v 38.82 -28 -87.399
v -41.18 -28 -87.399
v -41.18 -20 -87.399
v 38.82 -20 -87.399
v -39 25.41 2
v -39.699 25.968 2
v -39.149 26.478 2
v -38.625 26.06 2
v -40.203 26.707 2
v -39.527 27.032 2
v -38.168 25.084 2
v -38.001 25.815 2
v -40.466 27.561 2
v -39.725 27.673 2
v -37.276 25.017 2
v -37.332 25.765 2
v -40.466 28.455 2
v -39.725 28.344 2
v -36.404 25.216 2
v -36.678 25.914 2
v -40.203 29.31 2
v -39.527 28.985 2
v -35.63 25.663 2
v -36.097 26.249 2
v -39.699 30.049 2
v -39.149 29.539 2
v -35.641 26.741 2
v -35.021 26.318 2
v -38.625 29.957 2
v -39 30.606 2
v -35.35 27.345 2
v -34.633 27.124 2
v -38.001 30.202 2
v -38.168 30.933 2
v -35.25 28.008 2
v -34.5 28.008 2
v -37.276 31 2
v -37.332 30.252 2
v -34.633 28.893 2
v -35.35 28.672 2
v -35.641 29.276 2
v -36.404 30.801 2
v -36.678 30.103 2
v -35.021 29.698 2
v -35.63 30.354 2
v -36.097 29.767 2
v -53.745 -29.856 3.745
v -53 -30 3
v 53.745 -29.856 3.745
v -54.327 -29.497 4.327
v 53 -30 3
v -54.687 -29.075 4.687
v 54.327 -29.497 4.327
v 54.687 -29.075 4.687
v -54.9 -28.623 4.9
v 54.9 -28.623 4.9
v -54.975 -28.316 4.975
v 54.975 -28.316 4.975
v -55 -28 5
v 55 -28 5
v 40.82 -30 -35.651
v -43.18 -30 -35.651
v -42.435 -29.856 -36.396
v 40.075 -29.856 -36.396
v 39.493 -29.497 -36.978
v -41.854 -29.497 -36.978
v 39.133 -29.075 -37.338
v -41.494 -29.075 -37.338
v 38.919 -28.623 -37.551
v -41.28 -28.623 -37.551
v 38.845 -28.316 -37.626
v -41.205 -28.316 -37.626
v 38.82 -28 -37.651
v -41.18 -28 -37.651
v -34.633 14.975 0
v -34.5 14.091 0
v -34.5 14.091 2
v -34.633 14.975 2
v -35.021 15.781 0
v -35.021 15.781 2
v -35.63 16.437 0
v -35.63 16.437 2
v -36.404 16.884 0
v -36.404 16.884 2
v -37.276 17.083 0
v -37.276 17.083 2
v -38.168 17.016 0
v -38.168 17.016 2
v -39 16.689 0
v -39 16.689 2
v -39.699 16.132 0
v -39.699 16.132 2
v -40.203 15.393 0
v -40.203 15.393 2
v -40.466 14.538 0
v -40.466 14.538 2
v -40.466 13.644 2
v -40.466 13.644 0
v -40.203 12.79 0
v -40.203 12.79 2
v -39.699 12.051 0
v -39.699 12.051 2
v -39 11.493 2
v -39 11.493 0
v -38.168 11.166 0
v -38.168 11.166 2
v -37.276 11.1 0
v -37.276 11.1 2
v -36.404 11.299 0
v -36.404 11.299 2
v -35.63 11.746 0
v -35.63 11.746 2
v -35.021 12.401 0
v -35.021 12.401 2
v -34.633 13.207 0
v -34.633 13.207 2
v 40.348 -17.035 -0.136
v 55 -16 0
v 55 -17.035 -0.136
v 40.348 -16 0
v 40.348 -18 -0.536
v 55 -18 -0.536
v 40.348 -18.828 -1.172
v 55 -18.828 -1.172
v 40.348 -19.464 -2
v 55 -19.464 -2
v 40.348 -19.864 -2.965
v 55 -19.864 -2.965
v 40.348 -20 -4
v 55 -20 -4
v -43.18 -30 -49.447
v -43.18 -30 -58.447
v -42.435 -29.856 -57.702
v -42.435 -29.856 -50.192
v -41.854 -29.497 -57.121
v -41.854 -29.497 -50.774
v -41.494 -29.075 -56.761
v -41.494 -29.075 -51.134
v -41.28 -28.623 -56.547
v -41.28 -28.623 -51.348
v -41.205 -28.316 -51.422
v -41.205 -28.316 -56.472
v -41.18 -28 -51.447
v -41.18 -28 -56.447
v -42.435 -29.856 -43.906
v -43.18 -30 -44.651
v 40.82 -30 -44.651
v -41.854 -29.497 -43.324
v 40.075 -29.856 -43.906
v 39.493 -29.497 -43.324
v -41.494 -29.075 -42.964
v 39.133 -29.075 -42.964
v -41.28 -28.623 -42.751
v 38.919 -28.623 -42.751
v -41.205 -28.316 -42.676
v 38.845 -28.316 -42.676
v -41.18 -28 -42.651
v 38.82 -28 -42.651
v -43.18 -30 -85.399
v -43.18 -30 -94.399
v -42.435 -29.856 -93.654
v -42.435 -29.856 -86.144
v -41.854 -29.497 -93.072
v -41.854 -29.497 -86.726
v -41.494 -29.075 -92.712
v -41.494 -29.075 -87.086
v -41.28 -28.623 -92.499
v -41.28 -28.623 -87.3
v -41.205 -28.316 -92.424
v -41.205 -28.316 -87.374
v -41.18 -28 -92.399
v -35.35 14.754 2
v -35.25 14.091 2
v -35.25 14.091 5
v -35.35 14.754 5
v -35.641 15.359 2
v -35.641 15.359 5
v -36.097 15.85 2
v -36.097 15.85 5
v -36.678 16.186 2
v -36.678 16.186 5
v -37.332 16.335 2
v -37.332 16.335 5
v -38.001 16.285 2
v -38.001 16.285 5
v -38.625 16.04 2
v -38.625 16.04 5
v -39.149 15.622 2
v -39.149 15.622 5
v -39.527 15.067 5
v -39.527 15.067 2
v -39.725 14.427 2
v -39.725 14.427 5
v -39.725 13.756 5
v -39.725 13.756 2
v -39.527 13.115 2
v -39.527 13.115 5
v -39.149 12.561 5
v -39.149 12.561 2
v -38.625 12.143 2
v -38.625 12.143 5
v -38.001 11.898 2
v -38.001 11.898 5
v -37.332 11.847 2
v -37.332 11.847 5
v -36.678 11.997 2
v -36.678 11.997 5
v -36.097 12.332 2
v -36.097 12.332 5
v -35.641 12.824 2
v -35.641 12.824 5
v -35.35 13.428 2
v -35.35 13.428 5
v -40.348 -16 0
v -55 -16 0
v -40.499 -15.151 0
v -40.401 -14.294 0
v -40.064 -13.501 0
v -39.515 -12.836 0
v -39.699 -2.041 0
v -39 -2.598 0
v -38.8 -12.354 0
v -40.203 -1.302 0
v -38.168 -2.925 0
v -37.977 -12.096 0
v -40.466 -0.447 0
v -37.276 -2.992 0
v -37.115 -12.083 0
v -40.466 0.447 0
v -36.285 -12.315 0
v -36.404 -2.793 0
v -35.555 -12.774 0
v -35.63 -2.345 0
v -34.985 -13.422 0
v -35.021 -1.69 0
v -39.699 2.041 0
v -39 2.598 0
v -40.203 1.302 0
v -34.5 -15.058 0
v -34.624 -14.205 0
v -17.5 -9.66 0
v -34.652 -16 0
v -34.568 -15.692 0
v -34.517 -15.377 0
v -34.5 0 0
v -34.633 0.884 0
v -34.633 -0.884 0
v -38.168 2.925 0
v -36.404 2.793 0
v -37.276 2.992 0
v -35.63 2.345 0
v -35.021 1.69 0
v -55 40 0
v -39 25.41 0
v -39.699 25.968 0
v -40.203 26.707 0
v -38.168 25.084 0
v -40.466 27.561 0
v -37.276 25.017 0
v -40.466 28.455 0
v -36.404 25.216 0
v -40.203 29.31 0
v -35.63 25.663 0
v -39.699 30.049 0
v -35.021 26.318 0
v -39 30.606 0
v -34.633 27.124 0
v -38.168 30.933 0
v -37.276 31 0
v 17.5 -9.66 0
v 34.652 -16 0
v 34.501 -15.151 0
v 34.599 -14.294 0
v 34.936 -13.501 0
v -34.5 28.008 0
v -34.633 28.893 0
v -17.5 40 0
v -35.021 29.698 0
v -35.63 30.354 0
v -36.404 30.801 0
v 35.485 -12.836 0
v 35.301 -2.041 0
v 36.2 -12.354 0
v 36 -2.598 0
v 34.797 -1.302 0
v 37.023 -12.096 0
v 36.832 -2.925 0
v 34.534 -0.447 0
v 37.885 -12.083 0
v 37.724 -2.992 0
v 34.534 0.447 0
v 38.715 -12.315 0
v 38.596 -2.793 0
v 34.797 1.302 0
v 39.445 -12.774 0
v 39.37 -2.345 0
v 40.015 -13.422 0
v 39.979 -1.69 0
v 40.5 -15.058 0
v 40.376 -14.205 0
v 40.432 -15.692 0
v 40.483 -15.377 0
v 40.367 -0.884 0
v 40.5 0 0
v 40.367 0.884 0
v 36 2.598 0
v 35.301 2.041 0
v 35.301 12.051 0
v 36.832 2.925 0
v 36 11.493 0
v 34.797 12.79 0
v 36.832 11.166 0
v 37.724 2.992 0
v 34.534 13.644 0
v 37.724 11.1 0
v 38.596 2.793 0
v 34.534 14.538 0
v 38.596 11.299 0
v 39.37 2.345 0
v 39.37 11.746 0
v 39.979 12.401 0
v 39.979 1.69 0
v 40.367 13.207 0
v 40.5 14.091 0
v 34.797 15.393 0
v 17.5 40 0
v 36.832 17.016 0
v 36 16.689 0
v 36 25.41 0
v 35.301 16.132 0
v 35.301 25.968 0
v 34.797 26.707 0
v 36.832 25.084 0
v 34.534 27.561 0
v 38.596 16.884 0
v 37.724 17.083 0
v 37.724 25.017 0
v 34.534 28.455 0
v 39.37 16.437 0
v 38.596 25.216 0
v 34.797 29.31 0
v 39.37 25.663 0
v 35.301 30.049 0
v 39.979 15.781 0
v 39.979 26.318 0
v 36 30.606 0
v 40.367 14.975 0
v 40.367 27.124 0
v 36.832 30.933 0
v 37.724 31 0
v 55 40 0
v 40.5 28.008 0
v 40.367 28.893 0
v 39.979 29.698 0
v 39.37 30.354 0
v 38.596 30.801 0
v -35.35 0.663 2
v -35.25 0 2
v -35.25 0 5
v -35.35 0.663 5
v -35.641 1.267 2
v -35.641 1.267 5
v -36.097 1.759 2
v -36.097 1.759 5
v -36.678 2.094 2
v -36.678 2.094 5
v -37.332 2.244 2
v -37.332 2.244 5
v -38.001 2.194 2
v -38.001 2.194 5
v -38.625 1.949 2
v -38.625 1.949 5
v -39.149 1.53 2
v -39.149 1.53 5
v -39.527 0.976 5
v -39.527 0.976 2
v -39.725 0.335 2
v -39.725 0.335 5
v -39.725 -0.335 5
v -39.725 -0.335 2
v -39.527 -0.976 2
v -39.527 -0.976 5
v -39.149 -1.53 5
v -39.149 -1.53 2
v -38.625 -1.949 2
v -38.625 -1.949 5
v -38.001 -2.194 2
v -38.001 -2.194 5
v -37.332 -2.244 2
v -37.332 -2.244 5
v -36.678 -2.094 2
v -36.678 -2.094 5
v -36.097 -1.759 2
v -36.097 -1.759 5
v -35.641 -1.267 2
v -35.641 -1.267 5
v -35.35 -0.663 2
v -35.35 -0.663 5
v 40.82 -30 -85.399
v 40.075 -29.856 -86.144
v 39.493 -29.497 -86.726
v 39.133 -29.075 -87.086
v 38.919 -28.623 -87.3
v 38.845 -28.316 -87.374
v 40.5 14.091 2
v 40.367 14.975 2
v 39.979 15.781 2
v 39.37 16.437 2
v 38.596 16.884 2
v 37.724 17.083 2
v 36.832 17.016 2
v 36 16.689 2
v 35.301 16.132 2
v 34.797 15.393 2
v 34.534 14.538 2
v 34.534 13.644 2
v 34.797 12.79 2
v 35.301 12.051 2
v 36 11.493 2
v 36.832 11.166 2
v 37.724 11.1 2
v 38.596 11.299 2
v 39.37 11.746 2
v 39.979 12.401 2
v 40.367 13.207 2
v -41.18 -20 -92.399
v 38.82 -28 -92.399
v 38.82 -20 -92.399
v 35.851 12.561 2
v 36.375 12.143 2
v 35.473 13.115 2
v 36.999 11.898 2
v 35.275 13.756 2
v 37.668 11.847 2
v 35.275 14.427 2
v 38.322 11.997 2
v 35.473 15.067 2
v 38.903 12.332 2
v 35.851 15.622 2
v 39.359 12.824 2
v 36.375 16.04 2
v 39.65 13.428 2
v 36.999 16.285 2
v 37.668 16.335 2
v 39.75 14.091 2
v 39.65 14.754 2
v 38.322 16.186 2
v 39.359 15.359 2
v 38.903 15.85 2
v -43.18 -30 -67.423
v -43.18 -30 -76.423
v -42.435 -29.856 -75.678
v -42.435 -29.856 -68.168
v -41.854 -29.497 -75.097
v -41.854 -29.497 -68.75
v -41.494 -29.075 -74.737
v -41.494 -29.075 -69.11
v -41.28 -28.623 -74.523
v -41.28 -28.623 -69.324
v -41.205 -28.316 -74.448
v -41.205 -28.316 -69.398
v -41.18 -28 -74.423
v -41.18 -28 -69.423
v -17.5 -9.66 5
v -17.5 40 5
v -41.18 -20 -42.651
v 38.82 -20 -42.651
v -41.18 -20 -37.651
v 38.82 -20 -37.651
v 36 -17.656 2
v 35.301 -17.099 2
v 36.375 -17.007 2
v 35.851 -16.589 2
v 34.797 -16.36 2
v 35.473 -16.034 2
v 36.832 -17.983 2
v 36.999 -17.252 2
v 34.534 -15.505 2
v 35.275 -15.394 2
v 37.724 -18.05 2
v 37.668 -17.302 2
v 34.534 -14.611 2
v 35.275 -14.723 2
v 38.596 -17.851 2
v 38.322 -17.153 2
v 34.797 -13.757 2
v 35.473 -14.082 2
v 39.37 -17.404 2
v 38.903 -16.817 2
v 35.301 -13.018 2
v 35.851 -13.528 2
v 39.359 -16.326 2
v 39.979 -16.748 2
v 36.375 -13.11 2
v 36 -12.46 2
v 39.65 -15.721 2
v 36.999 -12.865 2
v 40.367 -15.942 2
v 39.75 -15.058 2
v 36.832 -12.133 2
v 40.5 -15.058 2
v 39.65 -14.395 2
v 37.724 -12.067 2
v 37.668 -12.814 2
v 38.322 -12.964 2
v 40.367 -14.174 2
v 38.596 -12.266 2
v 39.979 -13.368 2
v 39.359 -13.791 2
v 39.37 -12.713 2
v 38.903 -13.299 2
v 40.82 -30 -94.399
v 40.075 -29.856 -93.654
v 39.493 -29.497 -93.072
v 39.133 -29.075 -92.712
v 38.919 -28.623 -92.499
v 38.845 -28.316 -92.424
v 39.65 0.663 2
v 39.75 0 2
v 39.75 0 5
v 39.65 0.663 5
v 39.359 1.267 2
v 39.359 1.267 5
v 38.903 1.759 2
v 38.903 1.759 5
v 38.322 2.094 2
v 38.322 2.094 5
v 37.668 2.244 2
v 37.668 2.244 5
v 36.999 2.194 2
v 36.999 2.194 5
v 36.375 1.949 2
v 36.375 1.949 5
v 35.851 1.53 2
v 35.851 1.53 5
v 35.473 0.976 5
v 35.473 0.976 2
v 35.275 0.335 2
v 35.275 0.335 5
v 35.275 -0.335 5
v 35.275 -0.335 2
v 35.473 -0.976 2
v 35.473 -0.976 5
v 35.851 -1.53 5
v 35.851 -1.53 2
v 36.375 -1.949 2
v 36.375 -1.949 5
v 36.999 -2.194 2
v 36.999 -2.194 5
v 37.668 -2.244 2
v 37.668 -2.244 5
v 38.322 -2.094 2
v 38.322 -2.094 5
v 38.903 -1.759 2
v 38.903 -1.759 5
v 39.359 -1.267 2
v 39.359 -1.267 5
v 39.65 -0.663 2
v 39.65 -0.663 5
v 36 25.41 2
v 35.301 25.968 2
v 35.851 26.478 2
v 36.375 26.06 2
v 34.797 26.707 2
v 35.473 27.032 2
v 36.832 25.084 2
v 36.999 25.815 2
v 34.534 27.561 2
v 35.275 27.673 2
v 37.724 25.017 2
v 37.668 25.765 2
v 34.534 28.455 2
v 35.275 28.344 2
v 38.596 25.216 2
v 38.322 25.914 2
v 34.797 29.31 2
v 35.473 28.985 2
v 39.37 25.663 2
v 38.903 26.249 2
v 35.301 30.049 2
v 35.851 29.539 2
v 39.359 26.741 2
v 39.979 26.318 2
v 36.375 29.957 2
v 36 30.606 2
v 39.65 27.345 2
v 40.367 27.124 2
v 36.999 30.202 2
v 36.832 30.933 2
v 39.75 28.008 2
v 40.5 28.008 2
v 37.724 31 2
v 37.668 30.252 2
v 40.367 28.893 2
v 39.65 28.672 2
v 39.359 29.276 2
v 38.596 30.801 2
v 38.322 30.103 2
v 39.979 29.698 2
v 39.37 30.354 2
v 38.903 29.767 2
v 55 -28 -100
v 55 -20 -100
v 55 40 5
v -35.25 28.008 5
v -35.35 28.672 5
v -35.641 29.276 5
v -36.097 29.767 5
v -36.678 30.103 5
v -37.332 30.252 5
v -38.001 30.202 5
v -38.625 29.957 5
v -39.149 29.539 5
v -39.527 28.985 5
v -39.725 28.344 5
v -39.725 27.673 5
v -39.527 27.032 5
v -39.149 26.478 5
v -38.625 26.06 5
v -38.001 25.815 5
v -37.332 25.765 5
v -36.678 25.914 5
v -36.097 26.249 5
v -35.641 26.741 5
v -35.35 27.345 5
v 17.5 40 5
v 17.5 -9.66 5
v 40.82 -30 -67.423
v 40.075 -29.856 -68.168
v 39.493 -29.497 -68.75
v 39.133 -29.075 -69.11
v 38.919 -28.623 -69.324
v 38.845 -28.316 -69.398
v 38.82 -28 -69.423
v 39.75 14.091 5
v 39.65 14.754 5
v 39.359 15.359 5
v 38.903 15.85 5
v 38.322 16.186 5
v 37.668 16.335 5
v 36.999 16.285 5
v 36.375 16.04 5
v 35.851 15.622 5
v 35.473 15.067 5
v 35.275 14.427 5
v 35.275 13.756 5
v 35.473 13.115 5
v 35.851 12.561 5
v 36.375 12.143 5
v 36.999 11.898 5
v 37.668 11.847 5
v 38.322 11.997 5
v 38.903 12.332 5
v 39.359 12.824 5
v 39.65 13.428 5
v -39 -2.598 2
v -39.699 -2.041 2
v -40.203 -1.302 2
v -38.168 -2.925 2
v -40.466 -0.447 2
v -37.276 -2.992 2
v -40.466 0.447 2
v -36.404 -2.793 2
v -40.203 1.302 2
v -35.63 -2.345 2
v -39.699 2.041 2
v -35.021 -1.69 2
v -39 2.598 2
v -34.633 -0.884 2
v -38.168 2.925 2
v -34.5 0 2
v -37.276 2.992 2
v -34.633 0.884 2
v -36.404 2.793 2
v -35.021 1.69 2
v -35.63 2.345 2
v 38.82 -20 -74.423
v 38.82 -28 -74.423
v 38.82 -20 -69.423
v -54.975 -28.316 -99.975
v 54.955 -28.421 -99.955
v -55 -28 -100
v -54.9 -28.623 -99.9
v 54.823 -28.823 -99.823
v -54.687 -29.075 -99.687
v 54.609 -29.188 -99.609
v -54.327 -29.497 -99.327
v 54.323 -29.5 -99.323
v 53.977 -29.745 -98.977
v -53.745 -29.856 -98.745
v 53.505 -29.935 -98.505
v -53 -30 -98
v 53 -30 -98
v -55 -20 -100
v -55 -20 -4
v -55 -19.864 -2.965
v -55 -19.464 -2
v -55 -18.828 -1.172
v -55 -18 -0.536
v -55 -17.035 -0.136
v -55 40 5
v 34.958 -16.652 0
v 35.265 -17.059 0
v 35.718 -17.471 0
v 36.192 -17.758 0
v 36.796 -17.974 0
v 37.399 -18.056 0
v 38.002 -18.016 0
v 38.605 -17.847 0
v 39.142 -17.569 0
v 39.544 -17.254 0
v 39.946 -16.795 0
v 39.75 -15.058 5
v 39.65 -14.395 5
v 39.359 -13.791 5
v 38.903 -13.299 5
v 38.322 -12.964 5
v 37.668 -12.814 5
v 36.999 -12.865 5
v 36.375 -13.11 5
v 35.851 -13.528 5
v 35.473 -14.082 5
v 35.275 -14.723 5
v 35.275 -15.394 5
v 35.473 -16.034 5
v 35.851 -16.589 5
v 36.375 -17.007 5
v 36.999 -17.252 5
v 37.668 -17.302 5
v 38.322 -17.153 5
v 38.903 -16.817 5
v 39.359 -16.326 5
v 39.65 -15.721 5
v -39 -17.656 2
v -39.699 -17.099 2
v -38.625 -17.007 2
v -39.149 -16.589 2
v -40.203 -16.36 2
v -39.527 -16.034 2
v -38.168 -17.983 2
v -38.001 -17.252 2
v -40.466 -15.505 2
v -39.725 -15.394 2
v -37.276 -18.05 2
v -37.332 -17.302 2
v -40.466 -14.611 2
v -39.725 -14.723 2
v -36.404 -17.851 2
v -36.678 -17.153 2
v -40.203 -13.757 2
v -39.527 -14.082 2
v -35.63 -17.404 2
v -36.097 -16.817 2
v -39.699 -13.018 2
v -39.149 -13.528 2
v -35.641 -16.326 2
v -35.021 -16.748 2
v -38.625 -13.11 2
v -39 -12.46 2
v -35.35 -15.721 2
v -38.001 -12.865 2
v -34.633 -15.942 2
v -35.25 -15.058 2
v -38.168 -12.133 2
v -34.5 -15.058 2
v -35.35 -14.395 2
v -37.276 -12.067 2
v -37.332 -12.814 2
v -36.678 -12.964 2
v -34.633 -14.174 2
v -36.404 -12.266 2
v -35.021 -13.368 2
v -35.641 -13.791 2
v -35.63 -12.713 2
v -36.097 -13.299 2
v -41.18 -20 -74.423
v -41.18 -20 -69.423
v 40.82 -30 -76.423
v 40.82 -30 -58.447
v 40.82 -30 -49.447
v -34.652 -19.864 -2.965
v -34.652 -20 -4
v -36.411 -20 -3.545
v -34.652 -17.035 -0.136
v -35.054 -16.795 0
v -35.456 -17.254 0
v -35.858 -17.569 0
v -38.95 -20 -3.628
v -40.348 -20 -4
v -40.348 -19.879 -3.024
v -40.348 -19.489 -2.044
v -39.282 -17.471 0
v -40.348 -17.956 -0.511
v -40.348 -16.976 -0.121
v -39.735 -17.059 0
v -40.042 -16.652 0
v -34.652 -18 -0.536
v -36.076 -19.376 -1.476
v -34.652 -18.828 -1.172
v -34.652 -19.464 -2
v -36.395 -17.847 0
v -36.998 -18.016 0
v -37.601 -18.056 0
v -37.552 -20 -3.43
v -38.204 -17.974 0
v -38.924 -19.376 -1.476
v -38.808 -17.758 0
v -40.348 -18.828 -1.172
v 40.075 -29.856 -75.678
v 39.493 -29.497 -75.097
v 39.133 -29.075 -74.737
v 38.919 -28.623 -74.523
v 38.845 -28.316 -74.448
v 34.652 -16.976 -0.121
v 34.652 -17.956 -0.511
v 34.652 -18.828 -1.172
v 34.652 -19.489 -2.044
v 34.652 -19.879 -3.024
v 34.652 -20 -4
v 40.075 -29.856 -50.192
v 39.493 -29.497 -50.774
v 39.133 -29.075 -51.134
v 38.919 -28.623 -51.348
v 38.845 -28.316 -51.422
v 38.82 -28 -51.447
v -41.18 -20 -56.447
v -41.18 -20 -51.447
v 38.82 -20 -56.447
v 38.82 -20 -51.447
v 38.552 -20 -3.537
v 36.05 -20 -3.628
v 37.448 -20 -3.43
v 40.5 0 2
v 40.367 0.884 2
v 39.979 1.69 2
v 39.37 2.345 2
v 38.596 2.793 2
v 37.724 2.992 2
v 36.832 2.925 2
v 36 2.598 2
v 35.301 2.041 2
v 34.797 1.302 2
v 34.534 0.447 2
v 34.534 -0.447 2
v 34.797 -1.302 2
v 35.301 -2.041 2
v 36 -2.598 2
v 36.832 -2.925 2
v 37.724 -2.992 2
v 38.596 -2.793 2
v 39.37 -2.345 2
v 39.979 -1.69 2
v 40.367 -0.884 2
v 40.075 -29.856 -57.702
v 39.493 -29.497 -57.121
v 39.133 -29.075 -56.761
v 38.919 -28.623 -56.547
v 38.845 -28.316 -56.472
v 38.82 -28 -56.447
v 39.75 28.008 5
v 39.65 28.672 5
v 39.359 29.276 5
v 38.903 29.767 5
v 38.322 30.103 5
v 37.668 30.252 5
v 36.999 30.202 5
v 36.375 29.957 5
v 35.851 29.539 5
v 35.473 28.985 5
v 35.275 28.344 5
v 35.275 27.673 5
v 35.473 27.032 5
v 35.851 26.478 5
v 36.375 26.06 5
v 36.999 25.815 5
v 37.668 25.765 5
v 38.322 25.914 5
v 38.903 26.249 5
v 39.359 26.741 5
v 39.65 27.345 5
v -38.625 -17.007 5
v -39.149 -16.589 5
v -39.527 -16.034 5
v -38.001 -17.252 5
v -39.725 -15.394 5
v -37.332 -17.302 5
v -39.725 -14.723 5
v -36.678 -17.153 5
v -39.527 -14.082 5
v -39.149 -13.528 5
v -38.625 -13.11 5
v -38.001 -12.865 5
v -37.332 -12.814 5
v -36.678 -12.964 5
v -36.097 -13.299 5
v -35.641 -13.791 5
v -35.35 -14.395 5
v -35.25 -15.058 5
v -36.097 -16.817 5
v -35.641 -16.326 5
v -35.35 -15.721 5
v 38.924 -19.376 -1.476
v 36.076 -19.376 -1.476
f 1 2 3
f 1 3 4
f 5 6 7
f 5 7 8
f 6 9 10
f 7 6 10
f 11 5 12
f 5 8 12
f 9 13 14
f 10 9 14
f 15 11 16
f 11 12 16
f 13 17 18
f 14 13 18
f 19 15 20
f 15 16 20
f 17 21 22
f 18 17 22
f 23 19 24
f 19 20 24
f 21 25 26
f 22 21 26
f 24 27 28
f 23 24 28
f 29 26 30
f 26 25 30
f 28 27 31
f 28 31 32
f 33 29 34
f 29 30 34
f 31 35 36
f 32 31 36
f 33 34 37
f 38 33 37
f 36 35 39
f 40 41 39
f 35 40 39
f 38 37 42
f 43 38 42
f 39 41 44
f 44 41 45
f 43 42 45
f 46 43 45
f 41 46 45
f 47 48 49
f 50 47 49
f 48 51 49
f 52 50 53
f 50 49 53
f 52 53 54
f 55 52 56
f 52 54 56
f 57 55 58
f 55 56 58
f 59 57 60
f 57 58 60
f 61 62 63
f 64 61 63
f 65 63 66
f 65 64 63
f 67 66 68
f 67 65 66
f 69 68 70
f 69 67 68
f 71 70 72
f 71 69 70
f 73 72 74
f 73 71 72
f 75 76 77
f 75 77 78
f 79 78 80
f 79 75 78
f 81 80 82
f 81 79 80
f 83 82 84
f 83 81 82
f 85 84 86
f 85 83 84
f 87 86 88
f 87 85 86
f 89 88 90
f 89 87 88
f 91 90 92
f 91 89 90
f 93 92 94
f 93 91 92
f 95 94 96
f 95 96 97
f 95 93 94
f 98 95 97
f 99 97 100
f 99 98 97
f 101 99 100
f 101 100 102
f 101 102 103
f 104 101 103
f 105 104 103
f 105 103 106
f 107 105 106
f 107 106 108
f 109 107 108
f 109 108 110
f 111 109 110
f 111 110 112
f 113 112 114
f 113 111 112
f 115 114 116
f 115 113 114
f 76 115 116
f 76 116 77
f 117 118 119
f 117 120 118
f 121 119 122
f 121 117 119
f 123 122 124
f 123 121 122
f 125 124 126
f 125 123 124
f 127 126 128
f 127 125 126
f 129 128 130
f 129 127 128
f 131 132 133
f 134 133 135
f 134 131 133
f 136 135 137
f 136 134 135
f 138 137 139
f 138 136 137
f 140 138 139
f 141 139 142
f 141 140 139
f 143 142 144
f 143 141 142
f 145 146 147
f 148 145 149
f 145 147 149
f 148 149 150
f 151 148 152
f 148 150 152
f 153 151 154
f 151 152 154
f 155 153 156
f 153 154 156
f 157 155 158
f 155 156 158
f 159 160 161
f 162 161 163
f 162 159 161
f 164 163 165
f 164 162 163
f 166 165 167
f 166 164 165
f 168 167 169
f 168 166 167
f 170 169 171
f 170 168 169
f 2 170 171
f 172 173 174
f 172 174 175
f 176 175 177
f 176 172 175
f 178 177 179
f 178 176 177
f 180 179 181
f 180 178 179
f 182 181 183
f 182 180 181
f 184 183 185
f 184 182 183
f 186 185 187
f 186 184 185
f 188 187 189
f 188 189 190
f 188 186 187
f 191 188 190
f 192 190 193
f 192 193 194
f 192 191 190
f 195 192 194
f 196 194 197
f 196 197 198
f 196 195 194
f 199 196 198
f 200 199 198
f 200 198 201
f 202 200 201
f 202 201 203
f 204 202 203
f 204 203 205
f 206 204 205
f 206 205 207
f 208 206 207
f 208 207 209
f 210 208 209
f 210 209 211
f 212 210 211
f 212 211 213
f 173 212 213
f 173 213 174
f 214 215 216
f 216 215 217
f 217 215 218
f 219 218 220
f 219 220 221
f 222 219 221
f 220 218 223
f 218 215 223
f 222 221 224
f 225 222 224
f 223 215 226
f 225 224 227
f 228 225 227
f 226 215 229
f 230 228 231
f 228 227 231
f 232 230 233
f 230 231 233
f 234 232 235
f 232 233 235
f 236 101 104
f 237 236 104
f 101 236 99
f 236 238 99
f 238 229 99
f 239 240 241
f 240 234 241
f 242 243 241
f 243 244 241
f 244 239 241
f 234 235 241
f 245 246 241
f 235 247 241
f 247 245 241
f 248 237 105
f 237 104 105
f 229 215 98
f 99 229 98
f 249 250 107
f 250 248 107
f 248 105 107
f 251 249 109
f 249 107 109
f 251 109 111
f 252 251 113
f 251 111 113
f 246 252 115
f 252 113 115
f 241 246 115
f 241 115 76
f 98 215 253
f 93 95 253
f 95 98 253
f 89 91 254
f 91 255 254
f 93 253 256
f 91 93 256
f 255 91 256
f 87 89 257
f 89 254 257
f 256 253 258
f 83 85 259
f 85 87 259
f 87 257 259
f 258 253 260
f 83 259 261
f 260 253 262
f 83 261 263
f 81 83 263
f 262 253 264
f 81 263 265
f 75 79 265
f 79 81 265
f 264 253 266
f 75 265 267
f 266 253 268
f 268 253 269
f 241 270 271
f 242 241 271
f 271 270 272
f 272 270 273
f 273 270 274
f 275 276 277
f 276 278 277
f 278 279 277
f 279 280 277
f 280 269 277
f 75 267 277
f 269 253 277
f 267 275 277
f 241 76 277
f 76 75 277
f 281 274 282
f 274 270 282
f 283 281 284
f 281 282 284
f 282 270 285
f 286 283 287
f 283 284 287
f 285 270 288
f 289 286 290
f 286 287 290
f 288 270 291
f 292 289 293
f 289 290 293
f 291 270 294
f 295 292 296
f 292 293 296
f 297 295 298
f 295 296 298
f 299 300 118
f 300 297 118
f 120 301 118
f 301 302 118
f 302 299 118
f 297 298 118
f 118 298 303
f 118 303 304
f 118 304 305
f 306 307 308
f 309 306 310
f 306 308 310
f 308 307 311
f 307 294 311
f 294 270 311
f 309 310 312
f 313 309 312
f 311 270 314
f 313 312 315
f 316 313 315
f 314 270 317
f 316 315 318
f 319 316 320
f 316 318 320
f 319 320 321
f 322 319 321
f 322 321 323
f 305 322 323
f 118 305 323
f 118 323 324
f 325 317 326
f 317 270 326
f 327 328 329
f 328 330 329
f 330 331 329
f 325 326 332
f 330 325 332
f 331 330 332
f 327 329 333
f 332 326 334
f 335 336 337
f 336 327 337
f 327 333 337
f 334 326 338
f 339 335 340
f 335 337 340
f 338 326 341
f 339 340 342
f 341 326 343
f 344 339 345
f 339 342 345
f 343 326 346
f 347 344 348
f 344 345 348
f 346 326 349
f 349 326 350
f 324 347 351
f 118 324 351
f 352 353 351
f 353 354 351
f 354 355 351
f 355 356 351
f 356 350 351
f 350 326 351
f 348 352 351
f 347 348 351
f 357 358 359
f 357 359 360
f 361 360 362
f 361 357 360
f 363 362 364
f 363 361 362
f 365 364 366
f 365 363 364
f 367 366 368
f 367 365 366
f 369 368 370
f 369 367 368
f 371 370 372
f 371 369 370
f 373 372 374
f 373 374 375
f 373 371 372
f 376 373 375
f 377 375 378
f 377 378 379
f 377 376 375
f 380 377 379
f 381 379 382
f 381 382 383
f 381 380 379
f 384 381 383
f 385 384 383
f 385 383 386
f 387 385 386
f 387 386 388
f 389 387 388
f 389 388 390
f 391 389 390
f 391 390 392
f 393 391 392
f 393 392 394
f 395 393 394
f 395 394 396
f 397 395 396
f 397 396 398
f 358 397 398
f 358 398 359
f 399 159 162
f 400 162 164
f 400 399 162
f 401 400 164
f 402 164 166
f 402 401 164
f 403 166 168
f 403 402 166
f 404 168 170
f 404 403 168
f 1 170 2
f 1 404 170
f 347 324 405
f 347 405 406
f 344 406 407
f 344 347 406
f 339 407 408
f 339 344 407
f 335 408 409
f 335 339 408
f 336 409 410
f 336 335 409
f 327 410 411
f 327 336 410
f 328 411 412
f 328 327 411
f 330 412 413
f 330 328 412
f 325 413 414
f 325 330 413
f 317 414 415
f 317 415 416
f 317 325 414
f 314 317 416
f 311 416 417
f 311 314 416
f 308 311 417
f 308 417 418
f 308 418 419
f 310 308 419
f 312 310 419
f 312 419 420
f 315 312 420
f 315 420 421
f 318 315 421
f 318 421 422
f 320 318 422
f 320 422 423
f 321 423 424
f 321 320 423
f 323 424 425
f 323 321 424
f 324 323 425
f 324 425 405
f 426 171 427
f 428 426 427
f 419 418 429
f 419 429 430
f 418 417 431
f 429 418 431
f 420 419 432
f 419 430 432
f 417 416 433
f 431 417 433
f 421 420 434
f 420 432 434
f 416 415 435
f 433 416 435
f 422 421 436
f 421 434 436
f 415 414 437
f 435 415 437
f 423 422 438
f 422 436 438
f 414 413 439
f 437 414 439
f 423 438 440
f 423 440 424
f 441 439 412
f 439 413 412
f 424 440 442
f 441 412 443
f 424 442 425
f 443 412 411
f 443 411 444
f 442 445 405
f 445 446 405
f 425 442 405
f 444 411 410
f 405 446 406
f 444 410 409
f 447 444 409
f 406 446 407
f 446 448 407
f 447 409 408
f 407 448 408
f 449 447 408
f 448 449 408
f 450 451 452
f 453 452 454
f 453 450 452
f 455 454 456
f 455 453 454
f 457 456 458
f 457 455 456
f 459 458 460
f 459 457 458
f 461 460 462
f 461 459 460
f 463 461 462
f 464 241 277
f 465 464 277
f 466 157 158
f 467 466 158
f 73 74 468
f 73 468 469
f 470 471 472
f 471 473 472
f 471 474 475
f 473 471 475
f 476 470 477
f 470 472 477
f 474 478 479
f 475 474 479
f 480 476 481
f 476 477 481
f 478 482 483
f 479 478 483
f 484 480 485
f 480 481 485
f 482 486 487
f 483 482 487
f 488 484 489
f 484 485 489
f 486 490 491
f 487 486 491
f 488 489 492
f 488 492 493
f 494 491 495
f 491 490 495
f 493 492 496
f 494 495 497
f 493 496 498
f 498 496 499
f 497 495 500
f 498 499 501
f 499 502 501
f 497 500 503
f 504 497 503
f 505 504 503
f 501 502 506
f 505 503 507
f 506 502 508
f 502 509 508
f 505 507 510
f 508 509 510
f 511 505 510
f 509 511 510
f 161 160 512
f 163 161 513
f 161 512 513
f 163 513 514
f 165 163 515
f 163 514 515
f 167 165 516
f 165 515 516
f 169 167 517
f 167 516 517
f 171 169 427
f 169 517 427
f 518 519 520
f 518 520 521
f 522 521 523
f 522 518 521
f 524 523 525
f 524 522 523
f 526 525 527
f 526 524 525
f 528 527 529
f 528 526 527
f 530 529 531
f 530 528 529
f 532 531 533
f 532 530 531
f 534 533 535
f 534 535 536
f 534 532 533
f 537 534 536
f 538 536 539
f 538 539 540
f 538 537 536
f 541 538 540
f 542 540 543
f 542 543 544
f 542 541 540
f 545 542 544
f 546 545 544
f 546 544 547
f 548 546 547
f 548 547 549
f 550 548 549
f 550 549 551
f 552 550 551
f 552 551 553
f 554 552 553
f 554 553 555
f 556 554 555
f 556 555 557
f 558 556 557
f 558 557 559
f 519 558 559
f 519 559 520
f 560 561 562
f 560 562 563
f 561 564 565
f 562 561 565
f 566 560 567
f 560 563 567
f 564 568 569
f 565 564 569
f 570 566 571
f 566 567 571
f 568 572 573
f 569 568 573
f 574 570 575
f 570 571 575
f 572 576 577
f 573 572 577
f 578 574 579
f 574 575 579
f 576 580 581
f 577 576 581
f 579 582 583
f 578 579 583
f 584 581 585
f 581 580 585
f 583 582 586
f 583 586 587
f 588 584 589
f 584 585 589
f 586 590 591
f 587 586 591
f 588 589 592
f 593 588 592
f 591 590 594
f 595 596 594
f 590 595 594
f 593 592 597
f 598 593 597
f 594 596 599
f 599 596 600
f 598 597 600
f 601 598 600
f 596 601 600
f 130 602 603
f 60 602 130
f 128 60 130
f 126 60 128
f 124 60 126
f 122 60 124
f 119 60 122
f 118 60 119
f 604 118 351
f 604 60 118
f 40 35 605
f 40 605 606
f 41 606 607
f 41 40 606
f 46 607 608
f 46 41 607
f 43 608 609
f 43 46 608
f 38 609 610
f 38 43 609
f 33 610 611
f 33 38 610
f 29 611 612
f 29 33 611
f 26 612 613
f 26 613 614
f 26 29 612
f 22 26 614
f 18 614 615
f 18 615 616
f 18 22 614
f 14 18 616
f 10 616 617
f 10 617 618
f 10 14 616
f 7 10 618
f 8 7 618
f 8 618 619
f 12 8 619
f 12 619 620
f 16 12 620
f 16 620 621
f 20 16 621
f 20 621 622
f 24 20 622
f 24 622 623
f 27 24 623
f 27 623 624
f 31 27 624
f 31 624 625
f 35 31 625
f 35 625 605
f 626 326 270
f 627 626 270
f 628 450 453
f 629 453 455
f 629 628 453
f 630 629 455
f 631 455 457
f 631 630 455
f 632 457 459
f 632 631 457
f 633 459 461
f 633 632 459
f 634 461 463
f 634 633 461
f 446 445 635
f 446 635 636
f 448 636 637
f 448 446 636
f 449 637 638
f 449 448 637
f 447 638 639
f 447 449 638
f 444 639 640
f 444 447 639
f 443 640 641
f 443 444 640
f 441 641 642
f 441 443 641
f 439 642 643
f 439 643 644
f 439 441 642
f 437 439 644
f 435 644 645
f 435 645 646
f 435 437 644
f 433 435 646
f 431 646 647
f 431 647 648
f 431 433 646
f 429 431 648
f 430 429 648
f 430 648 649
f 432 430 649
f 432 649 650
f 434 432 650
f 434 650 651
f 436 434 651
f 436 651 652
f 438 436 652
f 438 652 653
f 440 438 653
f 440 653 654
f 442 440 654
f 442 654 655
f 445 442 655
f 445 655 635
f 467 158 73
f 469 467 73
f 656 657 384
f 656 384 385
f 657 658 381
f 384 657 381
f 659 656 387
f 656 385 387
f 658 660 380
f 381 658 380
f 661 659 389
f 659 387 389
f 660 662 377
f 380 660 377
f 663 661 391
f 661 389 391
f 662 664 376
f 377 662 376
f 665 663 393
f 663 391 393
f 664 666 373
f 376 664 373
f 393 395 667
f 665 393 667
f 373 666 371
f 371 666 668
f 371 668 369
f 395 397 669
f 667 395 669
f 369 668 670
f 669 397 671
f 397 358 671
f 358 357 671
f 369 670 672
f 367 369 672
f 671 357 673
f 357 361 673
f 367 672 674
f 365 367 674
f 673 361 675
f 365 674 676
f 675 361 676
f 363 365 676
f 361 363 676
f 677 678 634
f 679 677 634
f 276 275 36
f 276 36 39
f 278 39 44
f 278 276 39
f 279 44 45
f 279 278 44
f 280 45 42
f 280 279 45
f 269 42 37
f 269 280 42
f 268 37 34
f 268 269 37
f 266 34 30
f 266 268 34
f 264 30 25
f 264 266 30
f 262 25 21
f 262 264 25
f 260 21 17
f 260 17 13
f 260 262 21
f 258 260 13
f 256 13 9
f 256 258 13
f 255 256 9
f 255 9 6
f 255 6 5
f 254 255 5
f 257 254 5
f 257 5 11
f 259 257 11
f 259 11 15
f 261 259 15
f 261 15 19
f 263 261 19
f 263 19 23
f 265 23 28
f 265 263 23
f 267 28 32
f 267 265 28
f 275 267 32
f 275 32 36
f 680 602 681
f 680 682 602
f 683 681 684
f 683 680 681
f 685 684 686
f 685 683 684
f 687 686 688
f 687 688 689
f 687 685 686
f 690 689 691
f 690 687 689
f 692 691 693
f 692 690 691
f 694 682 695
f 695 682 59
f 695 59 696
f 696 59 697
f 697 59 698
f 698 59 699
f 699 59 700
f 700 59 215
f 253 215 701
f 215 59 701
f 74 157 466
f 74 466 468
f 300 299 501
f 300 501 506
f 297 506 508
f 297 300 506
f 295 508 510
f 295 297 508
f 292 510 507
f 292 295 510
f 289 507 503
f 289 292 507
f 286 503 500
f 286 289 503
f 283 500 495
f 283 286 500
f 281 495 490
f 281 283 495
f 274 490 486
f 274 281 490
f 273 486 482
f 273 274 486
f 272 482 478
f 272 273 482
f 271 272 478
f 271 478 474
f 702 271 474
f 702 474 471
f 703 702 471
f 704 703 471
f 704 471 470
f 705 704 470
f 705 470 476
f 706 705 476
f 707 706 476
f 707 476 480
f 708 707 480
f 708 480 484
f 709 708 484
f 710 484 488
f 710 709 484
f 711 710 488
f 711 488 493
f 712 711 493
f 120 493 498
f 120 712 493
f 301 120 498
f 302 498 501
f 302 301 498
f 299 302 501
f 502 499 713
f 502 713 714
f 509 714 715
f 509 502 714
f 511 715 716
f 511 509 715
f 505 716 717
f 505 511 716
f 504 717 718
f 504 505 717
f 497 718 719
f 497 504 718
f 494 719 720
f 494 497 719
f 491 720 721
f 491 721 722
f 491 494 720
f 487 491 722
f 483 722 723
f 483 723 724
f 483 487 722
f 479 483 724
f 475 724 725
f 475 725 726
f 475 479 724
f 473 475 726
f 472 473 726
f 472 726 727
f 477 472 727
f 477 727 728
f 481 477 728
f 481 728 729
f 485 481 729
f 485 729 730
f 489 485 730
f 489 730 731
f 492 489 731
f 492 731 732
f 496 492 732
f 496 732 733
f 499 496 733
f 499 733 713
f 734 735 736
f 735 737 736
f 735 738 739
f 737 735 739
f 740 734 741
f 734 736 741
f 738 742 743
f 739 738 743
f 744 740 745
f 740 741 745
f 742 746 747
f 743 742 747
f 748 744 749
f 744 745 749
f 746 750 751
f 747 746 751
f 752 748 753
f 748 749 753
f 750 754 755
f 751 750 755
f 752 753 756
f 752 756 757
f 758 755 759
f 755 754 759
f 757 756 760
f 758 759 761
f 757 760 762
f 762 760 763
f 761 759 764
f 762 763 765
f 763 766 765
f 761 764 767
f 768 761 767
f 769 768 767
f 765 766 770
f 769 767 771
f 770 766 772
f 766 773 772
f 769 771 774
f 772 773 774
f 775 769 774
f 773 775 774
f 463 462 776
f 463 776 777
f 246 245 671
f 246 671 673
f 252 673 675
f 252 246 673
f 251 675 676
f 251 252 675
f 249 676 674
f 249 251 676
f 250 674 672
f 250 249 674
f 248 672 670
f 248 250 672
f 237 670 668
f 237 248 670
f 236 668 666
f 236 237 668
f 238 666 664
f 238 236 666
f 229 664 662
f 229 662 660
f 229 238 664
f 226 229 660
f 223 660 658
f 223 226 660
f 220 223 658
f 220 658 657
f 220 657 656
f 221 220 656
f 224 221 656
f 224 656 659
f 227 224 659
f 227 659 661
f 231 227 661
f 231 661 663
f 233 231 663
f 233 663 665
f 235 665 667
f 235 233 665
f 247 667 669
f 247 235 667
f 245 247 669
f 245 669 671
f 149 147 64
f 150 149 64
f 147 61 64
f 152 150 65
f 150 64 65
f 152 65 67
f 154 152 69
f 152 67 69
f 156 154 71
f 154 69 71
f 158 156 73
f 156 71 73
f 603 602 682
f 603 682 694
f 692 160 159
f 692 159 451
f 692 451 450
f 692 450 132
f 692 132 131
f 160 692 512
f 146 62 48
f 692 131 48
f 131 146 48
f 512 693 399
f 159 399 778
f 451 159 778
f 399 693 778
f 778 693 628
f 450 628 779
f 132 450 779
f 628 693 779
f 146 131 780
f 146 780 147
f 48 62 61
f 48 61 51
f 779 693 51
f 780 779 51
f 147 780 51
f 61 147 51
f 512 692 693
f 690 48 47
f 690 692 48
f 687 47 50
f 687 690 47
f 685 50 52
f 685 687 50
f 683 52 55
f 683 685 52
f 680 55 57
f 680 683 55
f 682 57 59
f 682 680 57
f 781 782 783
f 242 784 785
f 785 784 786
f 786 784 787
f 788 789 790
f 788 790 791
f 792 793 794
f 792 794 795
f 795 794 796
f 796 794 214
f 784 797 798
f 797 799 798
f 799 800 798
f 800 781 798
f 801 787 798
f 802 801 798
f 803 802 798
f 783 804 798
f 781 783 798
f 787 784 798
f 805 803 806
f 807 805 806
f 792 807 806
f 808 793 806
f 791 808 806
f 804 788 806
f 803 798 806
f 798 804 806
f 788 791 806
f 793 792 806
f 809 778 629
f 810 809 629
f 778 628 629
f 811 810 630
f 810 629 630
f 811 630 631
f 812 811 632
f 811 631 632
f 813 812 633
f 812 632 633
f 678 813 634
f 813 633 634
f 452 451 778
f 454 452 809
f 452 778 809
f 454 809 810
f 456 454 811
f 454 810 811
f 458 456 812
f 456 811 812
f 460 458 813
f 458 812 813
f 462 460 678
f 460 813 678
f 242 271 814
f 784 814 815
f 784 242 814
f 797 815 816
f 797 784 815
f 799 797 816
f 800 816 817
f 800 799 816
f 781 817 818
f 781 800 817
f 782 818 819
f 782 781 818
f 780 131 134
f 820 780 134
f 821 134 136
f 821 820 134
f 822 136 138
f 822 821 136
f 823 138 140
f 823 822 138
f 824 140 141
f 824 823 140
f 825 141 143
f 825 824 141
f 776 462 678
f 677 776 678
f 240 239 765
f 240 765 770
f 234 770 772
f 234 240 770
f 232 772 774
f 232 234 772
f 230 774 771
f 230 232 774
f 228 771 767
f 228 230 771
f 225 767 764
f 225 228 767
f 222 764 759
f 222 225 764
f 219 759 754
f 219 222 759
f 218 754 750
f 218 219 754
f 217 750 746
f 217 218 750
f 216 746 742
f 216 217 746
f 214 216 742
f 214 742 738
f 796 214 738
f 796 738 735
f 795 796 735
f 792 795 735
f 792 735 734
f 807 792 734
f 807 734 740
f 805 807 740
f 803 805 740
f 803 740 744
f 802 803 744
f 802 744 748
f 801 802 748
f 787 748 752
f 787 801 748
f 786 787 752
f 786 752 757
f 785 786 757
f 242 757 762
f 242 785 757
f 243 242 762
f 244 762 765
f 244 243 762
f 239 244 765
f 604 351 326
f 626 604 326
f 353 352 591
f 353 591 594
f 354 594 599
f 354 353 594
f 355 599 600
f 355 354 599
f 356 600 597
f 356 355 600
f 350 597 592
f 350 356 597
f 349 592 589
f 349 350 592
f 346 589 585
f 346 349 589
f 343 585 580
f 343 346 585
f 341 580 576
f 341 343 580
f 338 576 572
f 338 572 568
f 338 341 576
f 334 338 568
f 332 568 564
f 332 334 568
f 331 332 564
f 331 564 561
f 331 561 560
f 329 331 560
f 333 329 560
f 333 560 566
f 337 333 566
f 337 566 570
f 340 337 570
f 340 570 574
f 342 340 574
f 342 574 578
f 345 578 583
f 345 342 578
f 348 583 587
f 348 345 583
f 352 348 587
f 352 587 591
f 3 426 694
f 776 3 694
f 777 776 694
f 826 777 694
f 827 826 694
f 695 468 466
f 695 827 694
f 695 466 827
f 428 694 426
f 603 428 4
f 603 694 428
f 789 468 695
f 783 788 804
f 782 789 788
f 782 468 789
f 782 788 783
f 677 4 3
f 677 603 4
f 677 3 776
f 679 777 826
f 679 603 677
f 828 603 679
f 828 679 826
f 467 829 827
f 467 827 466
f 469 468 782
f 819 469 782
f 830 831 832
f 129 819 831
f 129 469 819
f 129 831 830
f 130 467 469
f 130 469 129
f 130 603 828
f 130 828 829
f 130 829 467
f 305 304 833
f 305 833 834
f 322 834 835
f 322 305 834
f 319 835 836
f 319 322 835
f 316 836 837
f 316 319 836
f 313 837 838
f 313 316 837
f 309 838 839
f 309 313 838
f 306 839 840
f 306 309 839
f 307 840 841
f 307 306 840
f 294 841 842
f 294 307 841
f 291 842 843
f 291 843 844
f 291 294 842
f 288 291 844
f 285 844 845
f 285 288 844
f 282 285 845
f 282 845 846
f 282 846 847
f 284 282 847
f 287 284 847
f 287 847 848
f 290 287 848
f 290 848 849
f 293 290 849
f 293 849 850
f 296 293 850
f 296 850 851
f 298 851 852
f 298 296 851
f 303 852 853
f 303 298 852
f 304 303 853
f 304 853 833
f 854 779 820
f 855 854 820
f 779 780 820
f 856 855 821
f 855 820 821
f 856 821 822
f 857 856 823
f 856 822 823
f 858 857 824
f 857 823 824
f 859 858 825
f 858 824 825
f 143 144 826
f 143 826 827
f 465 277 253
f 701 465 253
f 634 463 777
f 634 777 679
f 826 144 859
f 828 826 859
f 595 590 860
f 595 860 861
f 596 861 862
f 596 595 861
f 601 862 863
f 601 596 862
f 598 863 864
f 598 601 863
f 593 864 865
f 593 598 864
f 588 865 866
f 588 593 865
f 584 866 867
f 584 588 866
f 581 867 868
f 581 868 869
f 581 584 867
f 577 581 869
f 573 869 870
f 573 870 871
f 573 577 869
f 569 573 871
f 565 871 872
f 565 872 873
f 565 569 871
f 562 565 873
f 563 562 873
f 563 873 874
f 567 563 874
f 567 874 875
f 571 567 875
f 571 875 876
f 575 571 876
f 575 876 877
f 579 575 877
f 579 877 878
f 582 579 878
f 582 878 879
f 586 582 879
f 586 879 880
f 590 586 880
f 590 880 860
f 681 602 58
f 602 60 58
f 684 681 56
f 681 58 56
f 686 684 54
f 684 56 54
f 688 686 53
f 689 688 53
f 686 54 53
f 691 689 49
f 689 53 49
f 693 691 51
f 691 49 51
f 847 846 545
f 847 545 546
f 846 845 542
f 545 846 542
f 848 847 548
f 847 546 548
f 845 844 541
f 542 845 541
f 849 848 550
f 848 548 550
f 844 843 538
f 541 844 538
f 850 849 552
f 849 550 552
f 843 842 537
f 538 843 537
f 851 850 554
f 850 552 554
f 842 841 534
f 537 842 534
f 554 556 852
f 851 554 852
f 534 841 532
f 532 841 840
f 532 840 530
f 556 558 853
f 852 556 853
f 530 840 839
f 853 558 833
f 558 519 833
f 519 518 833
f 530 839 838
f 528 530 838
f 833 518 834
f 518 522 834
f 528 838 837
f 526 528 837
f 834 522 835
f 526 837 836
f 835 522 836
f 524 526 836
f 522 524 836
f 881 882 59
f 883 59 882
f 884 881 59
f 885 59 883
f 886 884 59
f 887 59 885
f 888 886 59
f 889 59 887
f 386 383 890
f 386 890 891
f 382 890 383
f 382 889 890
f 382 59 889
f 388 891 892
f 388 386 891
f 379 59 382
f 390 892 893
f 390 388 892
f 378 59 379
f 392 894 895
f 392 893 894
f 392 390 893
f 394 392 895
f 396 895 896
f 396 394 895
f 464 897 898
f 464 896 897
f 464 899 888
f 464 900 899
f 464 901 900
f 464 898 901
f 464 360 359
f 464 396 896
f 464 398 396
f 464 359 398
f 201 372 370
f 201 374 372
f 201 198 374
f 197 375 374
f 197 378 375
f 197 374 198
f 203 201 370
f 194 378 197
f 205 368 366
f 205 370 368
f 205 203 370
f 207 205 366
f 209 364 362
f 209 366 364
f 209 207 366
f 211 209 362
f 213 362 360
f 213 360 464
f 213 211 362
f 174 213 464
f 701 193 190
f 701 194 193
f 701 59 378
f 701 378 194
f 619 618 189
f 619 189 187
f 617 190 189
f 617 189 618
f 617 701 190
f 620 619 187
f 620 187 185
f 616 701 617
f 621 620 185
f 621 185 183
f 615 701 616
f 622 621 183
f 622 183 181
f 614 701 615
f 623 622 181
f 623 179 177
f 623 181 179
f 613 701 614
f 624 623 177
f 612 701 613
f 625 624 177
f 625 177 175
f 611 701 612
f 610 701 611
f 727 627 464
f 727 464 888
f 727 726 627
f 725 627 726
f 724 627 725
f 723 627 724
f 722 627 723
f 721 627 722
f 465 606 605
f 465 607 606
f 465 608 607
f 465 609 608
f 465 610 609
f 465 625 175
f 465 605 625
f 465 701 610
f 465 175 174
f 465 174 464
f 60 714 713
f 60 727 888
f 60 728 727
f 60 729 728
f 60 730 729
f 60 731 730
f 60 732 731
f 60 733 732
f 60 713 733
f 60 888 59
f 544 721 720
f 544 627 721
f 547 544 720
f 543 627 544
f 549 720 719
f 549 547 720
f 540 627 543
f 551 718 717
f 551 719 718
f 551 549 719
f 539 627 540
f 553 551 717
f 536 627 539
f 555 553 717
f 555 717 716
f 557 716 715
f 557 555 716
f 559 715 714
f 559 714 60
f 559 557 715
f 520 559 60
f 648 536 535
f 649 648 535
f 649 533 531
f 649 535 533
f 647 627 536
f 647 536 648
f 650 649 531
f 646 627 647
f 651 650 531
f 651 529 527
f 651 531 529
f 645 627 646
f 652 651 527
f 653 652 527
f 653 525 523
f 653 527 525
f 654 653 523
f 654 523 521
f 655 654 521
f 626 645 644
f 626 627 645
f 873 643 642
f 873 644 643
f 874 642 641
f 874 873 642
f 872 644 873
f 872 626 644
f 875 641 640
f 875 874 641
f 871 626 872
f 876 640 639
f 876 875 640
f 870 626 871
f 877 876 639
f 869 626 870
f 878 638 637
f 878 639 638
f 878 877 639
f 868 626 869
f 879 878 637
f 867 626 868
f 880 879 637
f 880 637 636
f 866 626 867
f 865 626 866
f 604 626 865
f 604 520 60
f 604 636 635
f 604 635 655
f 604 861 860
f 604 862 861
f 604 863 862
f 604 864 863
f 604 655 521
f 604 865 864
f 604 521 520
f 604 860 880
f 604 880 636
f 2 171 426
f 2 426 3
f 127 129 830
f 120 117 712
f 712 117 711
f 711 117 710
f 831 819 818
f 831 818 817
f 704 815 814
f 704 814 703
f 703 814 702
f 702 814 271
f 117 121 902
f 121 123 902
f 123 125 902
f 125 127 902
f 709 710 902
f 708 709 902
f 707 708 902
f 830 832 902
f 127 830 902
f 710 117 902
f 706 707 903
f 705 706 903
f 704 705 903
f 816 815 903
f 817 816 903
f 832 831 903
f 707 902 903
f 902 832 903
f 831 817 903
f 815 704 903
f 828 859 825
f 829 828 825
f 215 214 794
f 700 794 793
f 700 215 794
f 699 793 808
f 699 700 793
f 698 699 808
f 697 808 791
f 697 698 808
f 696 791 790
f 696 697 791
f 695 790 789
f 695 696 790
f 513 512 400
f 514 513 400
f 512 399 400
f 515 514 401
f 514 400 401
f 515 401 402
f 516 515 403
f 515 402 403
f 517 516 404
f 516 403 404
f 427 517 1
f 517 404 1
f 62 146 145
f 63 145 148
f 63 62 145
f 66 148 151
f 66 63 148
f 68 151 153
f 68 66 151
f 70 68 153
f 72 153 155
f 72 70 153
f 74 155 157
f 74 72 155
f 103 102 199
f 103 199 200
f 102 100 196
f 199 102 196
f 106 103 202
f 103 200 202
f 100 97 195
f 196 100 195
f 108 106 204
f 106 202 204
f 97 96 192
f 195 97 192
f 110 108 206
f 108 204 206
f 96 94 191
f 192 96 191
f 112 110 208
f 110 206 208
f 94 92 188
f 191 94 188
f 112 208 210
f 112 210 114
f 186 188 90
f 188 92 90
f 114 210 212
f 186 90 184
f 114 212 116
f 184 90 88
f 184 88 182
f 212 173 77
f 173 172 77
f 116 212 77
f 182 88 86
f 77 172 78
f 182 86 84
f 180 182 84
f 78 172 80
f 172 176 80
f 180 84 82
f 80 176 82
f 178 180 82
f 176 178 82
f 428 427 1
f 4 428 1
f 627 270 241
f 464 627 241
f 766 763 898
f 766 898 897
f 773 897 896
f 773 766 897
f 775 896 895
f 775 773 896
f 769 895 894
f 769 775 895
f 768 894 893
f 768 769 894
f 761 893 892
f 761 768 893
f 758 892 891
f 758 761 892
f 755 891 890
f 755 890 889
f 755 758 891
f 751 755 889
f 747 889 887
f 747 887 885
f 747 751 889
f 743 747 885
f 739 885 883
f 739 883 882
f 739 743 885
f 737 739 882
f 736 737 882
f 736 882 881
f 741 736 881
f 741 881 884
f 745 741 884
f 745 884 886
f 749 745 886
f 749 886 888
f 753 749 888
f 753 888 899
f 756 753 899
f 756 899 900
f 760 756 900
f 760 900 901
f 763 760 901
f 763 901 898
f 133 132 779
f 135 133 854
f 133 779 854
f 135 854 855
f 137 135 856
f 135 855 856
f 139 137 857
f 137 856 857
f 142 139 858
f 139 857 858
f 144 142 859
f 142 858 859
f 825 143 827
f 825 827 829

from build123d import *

# Parameters (mm, degrees)
SKETCH_R        = 2.25
PAD_DEPTH       = 5
SKETCH001_R     = 3
POCKET_DEPTH    = 2
SKETCH002_W     = 10
SKETCH002_H     = 100
PAD001_DEPTH    = 110
FILLET_R        = 4
SKETCH003_W     = 80
SKETCH003_H     = 5
POCKET001_DEPTH = 70.001
FILLET001_R     = 2


with BuildPart() as part:
    # Sketch (on XY_Plane of Origin) → Pad (new body)
    with BuildSketch(Plane.XY):
        Polygon((-55, 40), (-55, -30), (55, -30), (55, 40), (17.5, 40), (17.5, -9.659887), (-17.5, -9.659887), (-17.5, 40), align=None)
        with Locations((-37.5, 0)):
            Circle(SKETCH_R, mode=Mode.SUBTRACT)
        with Locations((37.5, 0)):
            Circle(SKETCH_R, mode=Mode.SUBTRACT)
        with Locations((-37.5, 14.09116)):
            Circle(SKETCH_R, mode=Mode.SUBTRACT)
        with Locations((37.5, 14.09116)):
            Circle(SKETCH_R, mode=Mode.SUBTRACT)
        with Locations((-37.5, -15.058182)):
            Circle(SKETCH_R, mode=Mode.SUBTRACT)
        with Locations((37.5, -15.058182)):
            Circle(SKETCH_R, mode=Mode.SUBTRACT)
        with Locations((-37.5, 28.008329)):
            Circle(SKETCH_R, mode=Mode.SUBTRACT)
        with Locations((37.5, 28.008329)):
            Circle(SKETCH_R, mode=Mode.SUBTRACT)
    extrude(amount=PAD_DEPTH)

    # Sketch001 (on XY_Plane of Origin) → Pocket (cut)
    with BuildSketch(Plane.XY):
        with Locations((-37.5, 14.09116)):
            Circle(SKETCH001_R)
        with Locations((-37.5, 0)):
            Circle(SKETCH001_R)
        with Locations((-37.5, -15.058182)):
            Circle(SKETCH001_R)
        with Locations((37.5, 14.09116)):
            Circle(SKETCH001_R)
        with Locations((37.5, 0)):
            Circle(SKETCH001_R)
        with Locations((37.5, -15.058182)):
            Circle(SKETCH001_R)
        with Locations((-37.5, 28.008329)):
            Circle(SKETCH001_R)
        with Locations((37.5, 28.008329)):
            Circle(SKETCH001_R)
    extrude(amount=POCKET_DEPTH, mode=Mode.SUBTRACT)

    # Sketch002 (on Face7 of Pocket) → Pad001 (join)
    with BuildSketch(Plane.YZ.offset(55)):
        with Locations((-25, -50)):
            Rectangle(SKETCH002_W, SKETCH002_H)
    extrude(amount=-PAD001_DEPTH)

    # Fillet
    fillet_edges = [part.edges().sort_by_distance(p)[0] for p in [
        (0, -20, 0),
    ]]
    fillet(fillet_edges, radius=FILLET_R)

    # Sketch003 (on Face22 of Fillet) → Pocket001 (cut, through all)
    with BuildSketch(Plane.XZ.offset(30)):
        with Locations((-1.180287, -53.94736)):
            Rectangle(SKETCH003_W, SKETCH003_H)
        with Locations((-1.180287, -40.150993)):
            Rectangle(SKETCH003_W, SKETCH003_H)
        with Locations((-1.180287, -71.923223)):
            Rectangle(SKETCH003_W, SKETCH003_H)
        with Locations((-1.180287, -89.899086)):
            Rectangle(SKETCH003_W, SKETCH003_H)
    extrude(amount=-POCKET001_DEPTH, mode=Mode.SUBTRACT)

    # Fillet001
    fillet001_edges = [part.edges().sort_by_distance(p)[0] for p in [
        (-55, -30, -47.5),
        (0, -30, 5),
        (0, -30, -100),
        (55, -30, -47.5),
        (-41.180287, -30, -53.94736),
        (-1.180287, -30, -56.44736),
        (38.819713, -30, -53.94736),
        (-1.180287, -30, -51.44736),
        (-41.180287, -30, -40.150993),
        (-1.180287, -30, -42.650993),
        (38.819713, -30, -40.150993),
        (-1.180287, -30, -37.650993),
        (-41.180287, -30, -71.923223),
        (-1.180287, -30, -74.423223),
        (38.819713, -30, -71.923223),
        (-1.180287, -30, -69.423223),
        (-41.180287, -30, -89.899086),
        (-1.180287, -30, -92.399086),
        (38.819713, -30, -89.899086),
        (-1.180287, -30, -87.399086),
    ]]
    fillet(fillet001_edges, radius=FILLET001_R)


solid = part.part
